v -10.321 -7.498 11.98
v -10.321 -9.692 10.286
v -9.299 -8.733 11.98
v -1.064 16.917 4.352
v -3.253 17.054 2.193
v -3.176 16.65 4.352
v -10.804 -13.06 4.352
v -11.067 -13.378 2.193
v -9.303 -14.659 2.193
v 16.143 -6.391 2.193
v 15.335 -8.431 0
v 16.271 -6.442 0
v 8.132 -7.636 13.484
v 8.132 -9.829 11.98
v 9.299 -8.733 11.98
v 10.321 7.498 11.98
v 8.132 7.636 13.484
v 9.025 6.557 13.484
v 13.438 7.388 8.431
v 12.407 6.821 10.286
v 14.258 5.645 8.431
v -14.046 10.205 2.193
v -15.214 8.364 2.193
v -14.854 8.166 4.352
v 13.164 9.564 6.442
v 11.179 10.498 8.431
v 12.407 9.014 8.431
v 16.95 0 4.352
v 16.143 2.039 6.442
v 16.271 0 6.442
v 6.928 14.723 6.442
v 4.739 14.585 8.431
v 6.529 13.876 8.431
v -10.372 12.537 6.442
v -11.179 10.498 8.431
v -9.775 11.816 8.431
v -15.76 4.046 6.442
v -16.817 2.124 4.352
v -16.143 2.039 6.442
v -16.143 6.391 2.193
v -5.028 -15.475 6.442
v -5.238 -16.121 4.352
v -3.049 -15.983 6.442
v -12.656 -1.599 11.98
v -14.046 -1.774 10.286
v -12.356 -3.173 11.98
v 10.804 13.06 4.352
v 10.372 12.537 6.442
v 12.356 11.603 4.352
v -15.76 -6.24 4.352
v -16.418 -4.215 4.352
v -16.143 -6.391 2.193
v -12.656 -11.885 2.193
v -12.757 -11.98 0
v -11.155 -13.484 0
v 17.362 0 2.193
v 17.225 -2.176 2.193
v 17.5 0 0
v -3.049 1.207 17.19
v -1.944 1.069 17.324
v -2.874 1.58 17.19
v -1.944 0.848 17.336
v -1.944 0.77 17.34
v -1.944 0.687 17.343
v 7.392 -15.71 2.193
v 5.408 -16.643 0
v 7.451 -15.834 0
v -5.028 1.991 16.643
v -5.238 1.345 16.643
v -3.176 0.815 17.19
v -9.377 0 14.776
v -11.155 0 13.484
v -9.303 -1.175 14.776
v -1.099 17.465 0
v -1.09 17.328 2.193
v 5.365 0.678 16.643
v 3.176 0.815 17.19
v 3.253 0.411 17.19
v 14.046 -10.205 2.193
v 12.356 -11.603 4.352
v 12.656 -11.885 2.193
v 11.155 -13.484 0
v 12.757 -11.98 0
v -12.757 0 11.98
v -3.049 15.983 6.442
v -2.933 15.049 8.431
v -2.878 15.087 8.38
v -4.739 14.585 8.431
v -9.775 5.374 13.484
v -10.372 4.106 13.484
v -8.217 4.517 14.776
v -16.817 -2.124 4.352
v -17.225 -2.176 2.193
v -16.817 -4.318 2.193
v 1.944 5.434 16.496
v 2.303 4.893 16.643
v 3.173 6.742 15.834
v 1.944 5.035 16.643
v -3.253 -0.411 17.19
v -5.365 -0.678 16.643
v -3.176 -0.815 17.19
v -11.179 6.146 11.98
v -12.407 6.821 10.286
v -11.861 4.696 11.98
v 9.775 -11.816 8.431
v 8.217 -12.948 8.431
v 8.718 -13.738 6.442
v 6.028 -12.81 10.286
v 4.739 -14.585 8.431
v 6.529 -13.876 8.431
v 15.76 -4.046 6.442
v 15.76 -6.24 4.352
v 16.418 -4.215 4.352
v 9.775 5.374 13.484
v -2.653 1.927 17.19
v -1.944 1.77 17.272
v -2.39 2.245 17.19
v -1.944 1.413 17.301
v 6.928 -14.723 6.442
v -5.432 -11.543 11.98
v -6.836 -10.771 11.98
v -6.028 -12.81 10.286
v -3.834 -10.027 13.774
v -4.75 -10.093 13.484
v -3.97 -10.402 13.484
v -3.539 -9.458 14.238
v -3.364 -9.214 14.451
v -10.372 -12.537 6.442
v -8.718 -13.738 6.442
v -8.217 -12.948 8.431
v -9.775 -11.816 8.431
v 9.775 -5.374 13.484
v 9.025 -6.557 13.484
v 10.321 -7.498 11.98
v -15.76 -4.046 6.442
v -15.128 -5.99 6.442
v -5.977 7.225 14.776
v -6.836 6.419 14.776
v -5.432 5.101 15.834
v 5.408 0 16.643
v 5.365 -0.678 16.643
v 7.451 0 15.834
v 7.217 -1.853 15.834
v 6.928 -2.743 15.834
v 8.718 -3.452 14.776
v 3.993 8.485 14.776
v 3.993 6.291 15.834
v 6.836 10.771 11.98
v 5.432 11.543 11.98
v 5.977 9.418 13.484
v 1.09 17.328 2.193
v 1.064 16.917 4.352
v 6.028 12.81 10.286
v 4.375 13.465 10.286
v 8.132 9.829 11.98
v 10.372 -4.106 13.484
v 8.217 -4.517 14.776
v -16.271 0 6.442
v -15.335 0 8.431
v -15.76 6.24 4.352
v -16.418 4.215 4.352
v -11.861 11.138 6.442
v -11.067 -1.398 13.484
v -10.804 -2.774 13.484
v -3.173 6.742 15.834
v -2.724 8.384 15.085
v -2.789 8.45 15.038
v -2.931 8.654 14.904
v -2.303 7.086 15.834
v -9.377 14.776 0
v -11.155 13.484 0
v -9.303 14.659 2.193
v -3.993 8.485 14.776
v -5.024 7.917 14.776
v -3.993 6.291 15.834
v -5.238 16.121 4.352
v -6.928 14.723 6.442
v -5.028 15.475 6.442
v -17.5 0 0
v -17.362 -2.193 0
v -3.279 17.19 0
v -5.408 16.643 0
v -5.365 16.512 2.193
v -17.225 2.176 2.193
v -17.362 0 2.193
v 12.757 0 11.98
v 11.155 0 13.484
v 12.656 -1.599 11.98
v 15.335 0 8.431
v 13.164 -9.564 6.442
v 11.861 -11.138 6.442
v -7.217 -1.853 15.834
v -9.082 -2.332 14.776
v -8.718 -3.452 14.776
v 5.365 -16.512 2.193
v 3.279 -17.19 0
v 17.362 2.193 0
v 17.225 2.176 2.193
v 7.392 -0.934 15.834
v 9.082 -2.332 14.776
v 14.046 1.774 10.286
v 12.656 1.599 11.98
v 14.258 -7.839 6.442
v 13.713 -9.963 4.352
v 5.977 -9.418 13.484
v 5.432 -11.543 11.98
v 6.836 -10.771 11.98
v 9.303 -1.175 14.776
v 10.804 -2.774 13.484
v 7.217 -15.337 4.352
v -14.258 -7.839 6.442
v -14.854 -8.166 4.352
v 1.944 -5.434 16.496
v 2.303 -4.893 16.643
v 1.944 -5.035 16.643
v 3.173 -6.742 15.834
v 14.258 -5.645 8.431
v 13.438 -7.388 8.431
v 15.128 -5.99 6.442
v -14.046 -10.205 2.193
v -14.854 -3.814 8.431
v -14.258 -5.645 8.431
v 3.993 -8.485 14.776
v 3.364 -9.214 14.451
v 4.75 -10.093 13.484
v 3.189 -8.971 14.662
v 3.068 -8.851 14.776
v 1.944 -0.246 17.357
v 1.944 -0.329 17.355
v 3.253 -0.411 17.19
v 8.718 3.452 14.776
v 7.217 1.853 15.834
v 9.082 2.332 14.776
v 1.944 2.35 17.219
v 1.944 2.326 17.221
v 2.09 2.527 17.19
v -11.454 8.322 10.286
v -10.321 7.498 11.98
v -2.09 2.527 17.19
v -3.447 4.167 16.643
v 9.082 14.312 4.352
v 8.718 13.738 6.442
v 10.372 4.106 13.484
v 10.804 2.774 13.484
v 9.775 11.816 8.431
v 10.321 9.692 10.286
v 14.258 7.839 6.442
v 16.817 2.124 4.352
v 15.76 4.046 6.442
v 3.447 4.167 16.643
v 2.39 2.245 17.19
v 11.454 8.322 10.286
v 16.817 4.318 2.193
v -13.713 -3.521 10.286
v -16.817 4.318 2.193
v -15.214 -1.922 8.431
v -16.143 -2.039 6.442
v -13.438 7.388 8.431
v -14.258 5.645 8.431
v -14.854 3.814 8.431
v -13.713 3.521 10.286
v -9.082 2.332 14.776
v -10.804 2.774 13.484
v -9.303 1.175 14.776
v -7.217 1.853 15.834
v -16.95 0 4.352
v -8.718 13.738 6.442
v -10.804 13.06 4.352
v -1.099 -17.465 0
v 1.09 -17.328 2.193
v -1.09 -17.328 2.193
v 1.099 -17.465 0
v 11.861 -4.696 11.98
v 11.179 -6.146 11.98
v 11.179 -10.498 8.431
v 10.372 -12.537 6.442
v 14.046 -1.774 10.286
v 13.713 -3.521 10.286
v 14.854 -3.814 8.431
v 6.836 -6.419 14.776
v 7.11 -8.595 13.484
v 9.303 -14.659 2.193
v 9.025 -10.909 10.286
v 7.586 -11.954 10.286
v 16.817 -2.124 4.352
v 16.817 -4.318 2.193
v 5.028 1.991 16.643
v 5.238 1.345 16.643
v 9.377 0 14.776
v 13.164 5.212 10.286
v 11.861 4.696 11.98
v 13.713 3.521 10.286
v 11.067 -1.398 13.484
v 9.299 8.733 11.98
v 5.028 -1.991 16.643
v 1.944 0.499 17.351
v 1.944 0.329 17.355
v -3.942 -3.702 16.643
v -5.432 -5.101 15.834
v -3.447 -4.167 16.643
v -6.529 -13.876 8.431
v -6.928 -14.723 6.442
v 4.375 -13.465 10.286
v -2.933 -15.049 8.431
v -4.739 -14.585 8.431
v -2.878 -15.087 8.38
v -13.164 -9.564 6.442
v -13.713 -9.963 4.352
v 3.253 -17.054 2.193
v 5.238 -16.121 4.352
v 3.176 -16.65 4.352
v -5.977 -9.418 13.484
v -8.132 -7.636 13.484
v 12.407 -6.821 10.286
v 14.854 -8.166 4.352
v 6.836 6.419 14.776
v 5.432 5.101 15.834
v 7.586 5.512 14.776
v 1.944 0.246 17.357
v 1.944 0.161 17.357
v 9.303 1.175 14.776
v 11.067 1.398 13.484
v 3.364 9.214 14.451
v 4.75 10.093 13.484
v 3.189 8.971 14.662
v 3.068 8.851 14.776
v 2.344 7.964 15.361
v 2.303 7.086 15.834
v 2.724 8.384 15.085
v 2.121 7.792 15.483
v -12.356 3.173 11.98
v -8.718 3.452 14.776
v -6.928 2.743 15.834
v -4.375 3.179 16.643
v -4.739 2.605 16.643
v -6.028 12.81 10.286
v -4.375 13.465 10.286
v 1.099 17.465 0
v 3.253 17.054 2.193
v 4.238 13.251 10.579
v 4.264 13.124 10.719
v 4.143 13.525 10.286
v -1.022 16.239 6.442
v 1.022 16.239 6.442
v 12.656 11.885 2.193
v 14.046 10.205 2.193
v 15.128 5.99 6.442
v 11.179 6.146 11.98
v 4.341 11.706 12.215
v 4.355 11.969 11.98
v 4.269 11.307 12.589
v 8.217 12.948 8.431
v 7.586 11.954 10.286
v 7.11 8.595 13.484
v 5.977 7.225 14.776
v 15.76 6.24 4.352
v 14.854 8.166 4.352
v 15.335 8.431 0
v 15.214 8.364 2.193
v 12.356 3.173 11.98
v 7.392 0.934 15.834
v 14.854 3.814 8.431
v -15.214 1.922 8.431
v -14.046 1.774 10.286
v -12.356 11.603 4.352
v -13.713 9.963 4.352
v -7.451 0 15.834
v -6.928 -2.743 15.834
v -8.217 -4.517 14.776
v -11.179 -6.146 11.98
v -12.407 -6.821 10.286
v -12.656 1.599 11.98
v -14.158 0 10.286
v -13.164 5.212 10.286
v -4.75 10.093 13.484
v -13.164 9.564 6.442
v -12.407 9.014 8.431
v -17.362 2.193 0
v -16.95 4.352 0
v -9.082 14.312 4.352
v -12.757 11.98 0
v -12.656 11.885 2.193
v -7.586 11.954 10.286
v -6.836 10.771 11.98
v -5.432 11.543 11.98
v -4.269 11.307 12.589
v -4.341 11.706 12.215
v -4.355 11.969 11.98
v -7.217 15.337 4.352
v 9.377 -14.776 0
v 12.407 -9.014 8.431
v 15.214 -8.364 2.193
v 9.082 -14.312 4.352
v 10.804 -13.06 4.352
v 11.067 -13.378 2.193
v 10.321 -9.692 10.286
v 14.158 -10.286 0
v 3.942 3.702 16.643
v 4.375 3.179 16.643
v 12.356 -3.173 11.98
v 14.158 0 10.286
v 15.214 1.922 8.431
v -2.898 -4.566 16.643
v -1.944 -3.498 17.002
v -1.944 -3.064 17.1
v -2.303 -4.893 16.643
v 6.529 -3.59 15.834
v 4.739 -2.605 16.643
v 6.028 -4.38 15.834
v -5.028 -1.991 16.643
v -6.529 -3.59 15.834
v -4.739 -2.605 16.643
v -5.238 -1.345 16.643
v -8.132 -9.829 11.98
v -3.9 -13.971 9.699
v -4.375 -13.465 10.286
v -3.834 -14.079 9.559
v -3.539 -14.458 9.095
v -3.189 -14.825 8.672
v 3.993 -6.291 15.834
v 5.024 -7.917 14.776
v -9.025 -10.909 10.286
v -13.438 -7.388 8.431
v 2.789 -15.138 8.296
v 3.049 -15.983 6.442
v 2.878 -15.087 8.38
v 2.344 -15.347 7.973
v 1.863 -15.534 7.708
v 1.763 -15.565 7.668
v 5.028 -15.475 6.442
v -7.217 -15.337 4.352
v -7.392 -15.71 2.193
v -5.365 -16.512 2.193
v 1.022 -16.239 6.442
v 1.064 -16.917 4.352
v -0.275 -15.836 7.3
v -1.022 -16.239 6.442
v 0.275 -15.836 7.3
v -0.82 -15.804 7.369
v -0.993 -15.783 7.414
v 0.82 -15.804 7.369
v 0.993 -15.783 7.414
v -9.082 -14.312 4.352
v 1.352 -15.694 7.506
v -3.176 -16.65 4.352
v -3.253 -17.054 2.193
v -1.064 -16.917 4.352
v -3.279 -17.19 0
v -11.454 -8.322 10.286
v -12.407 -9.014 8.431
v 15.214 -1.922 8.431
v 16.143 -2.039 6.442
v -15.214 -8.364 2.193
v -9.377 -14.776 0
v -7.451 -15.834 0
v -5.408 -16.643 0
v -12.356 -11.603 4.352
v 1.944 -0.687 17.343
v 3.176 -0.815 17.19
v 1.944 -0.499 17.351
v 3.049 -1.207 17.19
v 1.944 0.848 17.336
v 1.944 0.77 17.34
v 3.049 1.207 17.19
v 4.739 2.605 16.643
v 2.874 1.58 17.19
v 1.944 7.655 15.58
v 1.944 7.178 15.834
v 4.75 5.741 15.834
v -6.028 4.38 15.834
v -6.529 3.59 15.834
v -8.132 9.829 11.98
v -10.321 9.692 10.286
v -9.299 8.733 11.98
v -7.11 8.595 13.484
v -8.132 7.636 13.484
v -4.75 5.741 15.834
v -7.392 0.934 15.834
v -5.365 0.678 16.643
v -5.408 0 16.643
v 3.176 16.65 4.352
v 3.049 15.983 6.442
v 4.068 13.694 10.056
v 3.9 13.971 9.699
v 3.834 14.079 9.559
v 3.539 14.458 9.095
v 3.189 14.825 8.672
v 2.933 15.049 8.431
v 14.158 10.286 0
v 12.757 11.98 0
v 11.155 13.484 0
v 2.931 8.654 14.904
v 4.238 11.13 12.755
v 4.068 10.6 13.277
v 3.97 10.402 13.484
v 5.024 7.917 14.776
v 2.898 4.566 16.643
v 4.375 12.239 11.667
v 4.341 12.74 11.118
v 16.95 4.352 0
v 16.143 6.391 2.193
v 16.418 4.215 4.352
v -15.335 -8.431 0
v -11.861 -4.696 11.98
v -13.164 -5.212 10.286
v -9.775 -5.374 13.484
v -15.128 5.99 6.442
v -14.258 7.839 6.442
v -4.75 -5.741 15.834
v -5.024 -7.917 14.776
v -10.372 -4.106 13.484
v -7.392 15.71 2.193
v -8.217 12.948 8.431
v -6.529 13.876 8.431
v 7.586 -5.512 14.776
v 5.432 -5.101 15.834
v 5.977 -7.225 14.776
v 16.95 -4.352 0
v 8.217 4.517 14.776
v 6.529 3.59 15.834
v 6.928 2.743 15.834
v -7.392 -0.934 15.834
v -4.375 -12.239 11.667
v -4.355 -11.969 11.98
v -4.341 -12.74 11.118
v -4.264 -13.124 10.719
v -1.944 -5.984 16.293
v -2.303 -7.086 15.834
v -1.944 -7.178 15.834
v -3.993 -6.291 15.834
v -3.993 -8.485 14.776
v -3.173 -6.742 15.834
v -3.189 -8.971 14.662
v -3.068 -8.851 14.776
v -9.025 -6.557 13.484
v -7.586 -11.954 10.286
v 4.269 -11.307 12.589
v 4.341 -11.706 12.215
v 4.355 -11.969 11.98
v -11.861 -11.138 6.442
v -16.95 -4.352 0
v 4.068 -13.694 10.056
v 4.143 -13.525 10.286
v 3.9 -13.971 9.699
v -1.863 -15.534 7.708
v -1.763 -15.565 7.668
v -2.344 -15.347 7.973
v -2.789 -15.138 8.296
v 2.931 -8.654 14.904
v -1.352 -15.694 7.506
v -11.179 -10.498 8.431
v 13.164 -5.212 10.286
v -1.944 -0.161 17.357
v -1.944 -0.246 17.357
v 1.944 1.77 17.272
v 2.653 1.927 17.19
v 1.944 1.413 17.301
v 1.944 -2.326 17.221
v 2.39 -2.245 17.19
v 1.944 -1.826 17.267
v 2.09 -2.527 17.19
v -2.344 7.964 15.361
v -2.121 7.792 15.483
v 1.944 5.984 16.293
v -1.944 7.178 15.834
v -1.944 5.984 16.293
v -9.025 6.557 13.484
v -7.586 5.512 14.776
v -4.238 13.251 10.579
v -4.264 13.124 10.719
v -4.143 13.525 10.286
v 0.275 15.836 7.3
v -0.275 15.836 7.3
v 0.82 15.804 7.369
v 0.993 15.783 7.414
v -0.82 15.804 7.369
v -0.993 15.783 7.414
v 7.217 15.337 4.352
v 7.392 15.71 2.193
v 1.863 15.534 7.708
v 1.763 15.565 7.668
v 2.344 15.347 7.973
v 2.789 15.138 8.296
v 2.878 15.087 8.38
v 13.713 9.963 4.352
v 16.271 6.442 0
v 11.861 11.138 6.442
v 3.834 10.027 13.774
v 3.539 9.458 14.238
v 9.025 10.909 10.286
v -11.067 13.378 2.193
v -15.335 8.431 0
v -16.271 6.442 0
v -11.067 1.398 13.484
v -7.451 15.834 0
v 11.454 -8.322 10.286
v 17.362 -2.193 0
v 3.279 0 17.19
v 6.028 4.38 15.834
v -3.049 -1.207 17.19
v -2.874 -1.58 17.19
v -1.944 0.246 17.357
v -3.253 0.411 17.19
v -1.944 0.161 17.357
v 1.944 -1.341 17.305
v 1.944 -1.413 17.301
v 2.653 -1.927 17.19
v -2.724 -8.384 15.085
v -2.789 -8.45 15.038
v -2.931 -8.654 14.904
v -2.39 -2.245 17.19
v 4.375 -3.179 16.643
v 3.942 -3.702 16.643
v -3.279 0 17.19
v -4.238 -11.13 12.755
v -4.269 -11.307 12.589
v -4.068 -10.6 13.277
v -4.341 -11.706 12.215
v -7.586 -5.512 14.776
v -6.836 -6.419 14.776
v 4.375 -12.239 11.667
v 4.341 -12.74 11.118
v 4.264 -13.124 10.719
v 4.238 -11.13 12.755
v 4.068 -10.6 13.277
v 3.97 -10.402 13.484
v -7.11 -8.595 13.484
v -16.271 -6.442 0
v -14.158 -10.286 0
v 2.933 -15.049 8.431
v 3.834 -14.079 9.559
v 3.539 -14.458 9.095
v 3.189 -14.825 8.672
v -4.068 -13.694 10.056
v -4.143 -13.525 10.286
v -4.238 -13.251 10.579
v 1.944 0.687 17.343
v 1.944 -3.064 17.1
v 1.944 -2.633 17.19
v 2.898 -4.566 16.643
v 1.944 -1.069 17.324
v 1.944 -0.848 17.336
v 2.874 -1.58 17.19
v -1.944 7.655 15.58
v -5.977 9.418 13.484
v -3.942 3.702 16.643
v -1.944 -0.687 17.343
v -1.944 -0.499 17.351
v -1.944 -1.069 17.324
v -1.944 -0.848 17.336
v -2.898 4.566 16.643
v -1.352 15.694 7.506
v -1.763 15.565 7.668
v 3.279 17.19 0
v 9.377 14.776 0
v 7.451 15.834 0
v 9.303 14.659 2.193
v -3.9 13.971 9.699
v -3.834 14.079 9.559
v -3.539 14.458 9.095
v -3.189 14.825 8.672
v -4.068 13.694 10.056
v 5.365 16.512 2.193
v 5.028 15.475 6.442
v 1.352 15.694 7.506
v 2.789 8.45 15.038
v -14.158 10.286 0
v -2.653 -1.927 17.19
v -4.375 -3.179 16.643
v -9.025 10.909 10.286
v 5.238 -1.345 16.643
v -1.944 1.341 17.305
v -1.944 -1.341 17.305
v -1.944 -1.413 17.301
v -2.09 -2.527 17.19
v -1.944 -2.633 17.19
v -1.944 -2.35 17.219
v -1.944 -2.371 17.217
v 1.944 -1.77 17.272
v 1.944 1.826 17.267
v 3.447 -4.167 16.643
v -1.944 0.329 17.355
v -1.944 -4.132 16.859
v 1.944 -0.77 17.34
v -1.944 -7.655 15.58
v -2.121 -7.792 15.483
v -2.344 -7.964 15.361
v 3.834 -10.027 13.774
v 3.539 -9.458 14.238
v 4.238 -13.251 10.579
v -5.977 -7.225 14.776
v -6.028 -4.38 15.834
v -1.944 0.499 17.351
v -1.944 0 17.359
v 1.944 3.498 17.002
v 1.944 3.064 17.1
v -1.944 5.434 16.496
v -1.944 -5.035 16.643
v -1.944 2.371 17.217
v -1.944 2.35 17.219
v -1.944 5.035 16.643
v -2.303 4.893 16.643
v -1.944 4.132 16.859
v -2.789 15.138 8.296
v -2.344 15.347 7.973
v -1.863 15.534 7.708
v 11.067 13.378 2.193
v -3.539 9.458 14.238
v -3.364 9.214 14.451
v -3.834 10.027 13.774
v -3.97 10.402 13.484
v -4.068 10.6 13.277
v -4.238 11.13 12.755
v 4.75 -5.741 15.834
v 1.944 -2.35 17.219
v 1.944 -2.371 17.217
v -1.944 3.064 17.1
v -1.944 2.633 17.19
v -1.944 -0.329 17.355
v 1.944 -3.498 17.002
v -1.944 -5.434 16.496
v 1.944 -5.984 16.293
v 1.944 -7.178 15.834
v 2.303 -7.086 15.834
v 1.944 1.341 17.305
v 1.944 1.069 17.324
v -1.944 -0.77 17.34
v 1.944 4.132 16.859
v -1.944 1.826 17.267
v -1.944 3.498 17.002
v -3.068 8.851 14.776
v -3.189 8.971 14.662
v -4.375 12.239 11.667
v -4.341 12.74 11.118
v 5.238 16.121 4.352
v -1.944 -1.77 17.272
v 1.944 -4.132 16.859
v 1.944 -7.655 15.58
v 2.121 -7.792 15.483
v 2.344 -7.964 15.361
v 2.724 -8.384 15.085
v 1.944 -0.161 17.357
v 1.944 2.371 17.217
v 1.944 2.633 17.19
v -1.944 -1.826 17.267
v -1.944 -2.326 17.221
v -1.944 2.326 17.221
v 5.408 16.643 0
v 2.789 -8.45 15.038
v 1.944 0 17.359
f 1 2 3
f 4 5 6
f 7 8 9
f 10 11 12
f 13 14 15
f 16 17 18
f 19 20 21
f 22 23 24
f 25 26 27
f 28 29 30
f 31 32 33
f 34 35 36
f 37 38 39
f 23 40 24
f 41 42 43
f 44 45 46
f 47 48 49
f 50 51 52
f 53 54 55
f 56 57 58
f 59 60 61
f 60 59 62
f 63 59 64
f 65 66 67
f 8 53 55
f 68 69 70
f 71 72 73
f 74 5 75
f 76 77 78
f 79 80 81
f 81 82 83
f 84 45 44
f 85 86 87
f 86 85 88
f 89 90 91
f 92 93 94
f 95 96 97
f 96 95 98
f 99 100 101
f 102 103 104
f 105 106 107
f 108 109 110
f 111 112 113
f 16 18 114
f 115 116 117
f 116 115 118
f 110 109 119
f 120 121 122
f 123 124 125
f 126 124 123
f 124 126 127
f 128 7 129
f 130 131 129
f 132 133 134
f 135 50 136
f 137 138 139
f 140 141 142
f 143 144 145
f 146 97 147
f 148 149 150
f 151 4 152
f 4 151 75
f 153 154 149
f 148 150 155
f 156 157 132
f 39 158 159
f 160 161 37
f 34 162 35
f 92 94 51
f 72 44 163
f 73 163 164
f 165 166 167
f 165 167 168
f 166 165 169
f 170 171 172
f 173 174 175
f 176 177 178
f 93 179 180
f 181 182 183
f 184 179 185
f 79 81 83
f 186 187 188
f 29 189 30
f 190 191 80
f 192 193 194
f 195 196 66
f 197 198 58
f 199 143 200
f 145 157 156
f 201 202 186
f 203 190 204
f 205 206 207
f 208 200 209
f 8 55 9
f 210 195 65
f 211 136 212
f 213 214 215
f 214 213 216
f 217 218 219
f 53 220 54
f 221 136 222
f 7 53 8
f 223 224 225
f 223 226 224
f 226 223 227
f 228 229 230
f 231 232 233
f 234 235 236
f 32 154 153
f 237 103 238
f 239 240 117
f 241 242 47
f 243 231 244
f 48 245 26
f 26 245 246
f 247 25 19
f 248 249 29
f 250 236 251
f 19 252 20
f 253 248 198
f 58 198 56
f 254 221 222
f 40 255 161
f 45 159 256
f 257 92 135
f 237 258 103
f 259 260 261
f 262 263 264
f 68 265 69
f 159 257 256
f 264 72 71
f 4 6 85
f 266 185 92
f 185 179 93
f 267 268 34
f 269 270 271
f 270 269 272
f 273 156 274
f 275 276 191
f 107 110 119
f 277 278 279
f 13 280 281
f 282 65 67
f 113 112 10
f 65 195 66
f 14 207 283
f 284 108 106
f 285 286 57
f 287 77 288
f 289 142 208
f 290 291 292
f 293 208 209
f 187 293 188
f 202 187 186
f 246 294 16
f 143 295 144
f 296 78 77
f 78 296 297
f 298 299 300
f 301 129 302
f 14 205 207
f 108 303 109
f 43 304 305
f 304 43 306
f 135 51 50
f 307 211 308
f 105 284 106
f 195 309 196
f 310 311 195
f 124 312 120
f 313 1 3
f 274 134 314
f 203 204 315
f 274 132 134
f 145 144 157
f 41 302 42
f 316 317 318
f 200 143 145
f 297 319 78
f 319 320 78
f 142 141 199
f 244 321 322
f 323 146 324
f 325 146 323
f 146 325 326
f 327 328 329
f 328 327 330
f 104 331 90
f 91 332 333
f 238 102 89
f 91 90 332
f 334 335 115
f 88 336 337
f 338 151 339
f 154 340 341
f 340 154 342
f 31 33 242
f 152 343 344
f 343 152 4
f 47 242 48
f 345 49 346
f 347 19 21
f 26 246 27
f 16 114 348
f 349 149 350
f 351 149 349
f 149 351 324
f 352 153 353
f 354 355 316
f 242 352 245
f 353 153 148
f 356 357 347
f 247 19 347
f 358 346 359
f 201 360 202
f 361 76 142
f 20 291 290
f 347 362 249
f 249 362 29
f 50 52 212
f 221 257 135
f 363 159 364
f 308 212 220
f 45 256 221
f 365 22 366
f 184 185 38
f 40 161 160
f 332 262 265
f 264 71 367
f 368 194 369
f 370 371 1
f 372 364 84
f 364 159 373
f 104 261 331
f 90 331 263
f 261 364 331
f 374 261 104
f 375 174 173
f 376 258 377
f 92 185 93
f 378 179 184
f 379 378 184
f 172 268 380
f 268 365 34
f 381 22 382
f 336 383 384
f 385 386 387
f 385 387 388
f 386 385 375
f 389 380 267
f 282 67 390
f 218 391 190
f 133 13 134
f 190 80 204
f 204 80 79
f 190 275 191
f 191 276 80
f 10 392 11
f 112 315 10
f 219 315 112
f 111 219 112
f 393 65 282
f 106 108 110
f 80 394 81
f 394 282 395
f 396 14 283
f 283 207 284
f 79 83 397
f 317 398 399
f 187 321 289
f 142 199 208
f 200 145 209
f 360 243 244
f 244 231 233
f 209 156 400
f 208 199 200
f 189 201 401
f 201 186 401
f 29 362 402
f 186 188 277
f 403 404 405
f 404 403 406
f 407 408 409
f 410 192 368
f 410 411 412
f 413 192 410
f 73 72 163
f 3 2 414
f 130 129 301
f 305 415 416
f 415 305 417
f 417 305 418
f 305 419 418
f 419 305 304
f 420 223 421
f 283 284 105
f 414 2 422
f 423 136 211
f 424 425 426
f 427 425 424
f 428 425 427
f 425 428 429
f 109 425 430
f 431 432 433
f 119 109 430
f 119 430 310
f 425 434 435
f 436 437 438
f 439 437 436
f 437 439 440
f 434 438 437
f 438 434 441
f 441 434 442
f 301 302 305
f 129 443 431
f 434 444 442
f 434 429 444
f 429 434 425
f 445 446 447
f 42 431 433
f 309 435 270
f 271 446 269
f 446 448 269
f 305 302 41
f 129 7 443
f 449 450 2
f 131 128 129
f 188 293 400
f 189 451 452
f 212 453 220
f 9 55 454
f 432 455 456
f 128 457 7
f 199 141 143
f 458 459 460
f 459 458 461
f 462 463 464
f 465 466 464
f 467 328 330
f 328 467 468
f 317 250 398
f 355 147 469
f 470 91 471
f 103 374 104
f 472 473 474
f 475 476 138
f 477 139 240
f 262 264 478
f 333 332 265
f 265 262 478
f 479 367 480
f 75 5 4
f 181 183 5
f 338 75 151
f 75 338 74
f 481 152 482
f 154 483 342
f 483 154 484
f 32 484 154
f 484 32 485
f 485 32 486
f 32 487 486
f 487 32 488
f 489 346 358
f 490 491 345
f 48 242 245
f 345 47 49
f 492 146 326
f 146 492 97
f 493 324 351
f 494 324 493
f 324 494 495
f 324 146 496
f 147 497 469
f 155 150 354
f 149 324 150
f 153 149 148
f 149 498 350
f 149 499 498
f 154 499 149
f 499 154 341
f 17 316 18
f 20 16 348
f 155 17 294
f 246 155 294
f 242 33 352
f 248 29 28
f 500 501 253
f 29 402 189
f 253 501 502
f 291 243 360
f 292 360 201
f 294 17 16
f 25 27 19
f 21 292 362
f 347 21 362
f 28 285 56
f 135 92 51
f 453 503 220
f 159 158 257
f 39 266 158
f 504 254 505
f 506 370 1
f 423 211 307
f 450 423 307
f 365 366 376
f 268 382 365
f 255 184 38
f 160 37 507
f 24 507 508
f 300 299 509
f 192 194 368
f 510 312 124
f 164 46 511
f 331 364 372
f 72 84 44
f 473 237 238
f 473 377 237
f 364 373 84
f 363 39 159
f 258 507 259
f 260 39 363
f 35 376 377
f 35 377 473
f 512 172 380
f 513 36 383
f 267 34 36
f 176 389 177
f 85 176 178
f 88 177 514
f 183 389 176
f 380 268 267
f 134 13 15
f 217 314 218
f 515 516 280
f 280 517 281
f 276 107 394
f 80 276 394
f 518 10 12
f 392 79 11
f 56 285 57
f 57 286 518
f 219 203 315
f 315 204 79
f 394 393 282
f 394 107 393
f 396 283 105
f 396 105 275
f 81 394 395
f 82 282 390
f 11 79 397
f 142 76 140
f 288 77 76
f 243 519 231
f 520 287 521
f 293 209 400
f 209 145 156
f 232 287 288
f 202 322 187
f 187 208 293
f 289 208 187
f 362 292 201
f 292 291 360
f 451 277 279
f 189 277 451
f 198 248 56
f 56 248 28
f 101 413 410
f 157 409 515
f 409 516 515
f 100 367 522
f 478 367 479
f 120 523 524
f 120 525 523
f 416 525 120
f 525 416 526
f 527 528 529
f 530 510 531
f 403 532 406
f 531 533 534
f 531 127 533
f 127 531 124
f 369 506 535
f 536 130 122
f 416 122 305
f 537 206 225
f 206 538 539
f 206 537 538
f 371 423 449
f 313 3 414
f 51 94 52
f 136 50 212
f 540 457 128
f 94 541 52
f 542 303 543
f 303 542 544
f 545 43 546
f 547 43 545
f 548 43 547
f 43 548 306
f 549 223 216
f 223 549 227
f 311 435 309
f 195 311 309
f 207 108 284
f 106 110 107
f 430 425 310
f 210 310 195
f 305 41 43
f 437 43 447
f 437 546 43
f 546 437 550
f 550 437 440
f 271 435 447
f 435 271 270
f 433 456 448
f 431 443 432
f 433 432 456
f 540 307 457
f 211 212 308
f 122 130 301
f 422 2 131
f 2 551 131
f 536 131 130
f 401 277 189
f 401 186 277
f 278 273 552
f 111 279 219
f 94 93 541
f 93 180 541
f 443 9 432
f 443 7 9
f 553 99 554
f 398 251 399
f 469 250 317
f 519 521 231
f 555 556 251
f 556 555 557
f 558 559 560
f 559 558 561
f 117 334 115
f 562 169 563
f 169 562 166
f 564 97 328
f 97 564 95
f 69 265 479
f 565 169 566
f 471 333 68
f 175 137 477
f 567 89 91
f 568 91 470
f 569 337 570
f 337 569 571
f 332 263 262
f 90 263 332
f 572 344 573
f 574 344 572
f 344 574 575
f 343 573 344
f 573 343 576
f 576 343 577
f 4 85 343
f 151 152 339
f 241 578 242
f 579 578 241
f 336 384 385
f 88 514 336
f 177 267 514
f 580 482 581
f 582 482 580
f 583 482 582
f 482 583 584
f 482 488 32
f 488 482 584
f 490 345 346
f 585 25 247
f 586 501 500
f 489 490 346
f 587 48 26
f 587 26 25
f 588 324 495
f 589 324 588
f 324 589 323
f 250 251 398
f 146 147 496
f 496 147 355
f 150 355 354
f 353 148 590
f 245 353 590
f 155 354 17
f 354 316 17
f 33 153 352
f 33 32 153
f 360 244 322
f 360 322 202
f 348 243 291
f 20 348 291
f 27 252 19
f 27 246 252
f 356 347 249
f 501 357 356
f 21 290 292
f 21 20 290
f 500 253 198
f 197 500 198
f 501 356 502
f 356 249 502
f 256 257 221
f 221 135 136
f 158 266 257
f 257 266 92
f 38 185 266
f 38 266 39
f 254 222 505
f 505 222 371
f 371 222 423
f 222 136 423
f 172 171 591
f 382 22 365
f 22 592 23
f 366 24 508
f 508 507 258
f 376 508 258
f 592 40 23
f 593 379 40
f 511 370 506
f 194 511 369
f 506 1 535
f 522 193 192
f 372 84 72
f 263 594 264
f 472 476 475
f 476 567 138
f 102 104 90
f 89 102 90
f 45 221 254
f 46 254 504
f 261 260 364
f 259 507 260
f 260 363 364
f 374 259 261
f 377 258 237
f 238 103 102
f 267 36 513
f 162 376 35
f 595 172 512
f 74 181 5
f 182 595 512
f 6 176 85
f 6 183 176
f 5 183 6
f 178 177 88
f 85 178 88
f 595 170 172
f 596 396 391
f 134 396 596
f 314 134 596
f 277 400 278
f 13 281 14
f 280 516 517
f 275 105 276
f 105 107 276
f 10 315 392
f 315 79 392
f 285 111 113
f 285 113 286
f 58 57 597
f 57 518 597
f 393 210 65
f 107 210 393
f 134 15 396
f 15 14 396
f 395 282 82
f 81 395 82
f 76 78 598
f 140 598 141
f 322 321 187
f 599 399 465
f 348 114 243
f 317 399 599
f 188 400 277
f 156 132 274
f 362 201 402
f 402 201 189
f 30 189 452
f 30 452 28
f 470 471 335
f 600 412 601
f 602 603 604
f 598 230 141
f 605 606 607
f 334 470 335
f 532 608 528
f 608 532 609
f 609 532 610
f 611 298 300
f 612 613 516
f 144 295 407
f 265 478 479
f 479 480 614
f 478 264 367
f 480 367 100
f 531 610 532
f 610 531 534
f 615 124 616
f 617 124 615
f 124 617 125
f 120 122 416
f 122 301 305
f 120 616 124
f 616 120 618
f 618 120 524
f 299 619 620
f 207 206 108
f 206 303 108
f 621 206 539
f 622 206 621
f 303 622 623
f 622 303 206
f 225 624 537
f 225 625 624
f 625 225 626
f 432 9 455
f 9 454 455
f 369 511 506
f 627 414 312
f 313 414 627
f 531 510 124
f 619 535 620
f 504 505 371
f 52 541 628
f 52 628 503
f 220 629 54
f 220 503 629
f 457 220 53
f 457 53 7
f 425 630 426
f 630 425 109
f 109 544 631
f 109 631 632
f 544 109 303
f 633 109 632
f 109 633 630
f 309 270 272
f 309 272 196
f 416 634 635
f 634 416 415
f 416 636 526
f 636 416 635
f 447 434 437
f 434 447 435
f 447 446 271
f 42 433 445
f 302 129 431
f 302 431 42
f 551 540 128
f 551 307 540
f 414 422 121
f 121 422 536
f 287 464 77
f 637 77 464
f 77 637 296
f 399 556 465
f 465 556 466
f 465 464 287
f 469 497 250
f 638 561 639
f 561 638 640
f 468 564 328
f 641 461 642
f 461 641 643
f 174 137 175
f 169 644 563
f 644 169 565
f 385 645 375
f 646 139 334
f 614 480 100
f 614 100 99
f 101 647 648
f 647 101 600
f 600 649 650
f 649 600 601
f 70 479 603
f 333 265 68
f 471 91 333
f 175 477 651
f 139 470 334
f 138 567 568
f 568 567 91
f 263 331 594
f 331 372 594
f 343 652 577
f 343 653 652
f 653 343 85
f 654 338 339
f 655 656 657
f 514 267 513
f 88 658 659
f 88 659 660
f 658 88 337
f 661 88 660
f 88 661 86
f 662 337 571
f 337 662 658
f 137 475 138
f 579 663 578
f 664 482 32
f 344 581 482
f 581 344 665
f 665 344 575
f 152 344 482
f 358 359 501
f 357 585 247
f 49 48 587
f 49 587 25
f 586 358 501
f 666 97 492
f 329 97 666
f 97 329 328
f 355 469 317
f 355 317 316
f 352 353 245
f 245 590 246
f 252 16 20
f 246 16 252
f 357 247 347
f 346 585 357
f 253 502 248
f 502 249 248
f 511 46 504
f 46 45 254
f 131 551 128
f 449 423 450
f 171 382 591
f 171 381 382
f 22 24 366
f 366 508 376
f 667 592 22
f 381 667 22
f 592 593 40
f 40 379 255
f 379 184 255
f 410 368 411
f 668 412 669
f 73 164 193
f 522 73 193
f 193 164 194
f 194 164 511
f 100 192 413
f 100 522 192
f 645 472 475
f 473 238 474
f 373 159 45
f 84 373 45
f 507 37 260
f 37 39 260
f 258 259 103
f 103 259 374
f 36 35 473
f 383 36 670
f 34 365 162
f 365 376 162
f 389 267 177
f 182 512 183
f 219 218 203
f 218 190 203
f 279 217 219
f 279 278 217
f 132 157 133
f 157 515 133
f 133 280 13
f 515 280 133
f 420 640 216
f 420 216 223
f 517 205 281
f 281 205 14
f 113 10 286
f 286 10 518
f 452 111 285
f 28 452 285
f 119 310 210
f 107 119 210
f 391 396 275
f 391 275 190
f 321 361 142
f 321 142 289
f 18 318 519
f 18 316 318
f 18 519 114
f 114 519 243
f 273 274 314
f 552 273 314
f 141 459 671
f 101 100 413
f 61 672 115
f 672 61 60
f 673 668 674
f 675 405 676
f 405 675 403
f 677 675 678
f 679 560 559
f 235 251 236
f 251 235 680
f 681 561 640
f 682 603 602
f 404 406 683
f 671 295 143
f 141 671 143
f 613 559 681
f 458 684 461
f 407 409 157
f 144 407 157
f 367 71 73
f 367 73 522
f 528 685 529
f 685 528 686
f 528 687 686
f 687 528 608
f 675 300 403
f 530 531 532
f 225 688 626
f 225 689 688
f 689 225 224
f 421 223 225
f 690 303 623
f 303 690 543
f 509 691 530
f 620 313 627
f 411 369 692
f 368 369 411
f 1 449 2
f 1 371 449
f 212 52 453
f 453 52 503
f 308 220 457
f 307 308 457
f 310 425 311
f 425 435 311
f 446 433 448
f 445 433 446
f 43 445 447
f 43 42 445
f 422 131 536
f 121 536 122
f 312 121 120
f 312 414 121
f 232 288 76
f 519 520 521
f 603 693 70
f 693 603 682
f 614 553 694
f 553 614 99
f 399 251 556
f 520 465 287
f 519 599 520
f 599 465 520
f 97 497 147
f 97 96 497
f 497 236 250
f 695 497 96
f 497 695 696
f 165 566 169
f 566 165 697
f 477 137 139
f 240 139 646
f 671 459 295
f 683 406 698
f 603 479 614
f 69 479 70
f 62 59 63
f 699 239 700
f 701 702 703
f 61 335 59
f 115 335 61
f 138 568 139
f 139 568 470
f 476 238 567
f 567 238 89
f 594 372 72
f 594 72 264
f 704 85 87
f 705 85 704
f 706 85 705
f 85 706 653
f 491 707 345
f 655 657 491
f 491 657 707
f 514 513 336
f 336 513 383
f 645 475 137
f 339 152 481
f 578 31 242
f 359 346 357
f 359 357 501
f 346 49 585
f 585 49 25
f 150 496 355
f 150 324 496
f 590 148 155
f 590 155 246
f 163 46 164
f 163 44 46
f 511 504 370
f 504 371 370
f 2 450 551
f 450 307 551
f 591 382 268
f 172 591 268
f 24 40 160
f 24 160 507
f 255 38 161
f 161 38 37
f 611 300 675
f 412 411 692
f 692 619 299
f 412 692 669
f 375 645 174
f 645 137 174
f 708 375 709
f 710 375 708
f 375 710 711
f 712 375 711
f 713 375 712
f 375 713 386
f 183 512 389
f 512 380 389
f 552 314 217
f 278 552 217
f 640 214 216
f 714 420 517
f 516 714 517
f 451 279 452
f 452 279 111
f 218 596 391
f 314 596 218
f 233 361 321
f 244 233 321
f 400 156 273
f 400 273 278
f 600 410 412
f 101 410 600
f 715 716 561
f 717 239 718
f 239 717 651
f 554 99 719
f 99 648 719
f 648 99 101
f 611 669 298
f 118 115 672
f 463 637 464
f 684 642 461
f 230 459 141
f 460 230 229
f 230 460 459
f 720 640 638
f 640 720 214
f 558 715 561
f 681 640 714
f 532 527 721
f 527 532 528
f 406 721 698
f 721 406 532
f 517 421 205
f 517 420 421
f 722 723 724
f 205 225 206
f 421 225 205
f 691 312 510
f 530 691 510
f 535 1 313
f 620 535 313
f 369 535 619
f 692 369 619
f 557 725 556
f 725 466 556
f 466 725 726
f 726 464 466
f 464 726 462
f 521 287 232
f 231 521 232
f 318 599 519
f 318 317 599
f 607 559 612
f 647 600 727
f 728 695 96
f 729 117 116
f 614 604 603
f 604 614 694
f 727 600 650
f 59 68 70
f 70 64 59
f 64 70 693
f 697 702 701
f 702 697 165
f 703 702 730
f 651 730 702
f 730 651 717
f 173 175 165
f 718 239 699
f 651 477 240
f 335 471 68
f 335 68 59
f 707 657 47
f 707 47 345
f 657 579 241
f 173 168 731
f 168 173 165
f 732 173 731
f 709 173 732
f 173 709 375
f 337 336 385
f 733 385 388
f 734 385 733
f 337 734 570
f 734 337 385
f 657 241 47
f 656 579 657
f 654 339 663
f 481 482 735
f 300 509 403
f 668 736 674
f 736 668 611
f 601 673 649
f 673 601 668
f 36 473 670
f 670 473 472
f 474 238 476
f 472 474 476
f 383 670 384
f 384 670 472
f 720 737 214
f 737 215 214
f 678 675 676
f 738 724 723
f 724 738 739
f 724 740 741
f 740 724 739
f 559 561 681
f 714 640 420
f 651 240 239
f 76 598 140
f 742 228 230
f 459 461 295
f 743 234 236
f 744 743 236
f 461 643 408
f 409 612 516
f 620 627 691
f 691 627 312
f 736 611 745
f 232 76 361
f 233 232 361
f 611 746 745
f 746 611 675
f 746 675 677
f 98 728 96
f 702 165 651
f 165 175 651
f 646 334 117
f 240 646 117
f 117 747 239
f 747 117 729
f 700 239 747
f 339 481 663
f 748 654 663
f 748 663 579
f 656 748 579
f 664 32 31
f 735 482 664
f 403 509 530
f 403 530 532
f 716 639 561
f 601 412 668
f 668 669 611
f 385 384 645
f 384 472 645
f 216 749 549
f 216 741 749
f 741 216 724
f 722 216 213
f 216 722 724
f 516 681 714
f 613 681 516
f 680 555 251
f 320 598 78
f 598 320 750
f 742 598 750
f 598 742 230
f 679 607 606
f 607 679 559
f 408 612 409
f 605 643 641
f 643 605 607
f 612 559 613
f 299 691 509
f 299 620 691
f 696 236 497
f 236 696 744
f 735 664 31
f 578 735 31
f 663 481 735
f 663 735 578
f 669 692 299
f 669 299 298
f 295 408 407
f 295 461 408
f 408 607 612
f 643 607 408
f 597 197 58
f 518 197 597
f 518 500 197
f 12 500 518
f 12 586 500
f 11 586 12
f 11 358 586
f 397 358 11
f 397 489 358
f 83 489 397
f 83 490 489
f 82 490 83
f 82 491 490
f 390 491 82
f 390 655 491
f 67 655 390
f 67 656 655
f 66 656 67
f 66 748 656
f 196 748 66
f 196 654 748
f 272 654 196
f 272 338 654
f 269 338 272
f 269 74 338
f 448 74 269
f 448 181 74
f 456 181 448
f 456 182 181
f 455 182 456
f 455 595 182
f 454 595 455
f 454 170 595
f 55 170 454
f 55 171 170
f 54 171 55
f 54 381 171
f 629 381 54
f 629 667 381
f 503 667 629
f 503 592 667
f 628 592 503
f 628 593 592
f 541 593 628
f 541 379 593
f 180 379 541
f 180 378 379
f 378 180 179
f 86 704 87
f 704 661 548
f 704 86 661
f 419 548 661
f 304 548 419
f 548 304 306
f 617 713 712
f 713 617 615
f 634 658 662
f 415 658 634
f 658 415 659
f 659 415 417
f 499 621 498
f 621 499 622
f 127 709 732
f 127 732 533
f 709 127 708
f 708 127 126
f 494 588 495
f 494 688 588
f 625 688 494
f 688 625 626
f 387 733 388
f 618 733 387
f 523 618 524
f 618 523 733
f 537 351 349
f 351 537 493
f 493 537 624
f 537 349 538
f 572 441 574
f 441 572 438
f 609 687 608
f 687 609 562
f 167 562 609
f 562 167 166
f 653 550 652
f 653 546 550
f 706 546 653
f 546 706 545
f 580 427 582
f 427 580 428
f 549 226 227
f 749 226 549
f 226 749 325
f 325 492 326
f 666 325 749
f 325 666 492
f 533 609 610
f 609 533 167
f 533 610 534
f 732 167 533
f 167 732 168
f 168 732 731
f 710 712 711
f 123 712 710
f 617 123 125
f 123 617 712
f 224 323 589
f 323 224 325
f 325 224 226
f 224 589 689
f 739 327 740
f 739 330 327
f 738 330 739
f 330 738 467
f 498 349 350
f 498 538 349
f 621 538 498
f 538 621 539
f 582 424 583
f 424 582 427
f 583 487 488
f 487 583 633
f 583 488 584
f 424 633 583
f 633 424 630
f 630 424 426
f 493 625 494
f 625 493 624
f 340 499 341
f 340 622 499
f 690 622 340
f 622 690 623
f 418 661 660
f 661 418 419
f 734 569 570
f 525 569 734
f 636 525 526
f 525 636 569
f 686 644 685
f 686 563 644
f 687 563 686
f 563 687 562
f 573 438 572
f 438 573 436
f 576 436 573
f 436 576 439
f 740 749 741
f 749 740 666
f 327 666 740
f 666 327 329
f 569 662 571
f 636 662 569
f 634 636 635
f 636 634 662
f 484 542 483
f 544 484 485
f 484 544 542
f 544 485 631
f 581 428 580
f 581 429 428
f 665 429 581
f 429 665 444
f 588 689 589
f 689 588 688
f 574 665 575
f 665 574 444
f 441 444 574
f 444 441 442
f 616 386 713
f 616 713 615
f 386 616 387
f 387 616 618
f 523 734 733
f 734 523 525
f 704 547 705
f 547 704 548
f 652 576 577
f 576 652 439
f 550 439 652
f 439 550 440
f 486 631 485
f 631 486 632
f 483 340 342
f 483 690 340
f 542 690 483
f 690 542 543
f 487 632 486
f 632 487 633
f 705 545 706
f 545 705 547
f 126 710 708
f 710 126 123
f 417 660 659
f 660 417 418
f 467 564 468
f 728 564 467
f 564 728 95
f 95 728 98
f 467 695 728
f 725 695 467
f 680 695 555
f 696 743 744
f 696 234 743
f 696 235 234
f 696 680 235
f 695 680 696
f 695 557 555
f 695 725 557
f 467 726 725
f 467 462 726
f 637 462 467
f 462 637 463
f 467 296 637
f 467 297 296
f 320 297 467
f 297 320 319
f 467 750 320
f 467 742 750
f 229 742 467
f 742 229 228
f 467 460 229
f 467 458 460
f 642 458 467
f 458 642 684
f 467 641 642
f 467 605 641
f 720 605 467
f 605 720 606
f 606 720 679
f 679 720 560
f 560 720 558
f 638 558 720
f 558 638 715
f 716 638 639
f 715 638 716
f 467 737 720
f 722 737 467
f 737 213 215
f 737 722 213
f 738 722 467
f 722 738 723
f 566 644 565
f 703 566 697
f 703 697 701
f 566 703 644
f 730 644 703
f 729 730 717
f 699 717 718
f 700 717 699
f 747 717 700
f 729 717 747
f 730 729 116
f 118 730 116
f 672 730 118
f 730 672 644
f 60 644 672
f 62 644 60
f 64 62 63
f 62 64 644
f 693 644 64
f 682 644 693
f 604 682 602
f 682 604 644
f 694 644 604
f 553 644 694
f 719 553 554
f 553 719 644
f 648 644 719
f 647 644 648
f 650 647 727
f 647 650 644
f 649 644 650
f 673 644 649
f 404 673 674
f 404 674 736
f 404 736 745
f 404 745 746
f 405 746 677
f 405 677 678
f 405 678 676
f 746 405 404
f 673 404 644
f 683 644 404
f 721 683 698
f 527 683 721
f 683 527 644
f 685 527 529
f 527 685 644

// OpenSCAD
$fn = 50;


// CHANGE
size = 35;


// CONSTANTS
diameter = size;
hole_diameter = diameter/4;
hole_depth = diameter;
opening_width = diameter/9;

// small top opening
//minkowski(){
	//sphere(1); 
	difference(){
		
		// cable holding hole
		difference(){
			
			// cutting bottom half of circle
			difference(){
				sphere(d=diameter);
	
				// cut with cube	
				translate([0,0,-diameter/4]){
					cube([diameter,diameter,diameter/2],center = true);
				}
			}
			
			// cut with cylinder
			translate([0, hole_depth/2, diameter/3]){
				rotate([90,0,0]){
					cylinder(h = hole_depth, d = hole_diameter);
				}
			}
		}
		
		// cut with small cube
		translate([0,0,diameter/2]){
			cube([opening_width,hole_depth,opening_width], center = true);
		}
	}
//}
